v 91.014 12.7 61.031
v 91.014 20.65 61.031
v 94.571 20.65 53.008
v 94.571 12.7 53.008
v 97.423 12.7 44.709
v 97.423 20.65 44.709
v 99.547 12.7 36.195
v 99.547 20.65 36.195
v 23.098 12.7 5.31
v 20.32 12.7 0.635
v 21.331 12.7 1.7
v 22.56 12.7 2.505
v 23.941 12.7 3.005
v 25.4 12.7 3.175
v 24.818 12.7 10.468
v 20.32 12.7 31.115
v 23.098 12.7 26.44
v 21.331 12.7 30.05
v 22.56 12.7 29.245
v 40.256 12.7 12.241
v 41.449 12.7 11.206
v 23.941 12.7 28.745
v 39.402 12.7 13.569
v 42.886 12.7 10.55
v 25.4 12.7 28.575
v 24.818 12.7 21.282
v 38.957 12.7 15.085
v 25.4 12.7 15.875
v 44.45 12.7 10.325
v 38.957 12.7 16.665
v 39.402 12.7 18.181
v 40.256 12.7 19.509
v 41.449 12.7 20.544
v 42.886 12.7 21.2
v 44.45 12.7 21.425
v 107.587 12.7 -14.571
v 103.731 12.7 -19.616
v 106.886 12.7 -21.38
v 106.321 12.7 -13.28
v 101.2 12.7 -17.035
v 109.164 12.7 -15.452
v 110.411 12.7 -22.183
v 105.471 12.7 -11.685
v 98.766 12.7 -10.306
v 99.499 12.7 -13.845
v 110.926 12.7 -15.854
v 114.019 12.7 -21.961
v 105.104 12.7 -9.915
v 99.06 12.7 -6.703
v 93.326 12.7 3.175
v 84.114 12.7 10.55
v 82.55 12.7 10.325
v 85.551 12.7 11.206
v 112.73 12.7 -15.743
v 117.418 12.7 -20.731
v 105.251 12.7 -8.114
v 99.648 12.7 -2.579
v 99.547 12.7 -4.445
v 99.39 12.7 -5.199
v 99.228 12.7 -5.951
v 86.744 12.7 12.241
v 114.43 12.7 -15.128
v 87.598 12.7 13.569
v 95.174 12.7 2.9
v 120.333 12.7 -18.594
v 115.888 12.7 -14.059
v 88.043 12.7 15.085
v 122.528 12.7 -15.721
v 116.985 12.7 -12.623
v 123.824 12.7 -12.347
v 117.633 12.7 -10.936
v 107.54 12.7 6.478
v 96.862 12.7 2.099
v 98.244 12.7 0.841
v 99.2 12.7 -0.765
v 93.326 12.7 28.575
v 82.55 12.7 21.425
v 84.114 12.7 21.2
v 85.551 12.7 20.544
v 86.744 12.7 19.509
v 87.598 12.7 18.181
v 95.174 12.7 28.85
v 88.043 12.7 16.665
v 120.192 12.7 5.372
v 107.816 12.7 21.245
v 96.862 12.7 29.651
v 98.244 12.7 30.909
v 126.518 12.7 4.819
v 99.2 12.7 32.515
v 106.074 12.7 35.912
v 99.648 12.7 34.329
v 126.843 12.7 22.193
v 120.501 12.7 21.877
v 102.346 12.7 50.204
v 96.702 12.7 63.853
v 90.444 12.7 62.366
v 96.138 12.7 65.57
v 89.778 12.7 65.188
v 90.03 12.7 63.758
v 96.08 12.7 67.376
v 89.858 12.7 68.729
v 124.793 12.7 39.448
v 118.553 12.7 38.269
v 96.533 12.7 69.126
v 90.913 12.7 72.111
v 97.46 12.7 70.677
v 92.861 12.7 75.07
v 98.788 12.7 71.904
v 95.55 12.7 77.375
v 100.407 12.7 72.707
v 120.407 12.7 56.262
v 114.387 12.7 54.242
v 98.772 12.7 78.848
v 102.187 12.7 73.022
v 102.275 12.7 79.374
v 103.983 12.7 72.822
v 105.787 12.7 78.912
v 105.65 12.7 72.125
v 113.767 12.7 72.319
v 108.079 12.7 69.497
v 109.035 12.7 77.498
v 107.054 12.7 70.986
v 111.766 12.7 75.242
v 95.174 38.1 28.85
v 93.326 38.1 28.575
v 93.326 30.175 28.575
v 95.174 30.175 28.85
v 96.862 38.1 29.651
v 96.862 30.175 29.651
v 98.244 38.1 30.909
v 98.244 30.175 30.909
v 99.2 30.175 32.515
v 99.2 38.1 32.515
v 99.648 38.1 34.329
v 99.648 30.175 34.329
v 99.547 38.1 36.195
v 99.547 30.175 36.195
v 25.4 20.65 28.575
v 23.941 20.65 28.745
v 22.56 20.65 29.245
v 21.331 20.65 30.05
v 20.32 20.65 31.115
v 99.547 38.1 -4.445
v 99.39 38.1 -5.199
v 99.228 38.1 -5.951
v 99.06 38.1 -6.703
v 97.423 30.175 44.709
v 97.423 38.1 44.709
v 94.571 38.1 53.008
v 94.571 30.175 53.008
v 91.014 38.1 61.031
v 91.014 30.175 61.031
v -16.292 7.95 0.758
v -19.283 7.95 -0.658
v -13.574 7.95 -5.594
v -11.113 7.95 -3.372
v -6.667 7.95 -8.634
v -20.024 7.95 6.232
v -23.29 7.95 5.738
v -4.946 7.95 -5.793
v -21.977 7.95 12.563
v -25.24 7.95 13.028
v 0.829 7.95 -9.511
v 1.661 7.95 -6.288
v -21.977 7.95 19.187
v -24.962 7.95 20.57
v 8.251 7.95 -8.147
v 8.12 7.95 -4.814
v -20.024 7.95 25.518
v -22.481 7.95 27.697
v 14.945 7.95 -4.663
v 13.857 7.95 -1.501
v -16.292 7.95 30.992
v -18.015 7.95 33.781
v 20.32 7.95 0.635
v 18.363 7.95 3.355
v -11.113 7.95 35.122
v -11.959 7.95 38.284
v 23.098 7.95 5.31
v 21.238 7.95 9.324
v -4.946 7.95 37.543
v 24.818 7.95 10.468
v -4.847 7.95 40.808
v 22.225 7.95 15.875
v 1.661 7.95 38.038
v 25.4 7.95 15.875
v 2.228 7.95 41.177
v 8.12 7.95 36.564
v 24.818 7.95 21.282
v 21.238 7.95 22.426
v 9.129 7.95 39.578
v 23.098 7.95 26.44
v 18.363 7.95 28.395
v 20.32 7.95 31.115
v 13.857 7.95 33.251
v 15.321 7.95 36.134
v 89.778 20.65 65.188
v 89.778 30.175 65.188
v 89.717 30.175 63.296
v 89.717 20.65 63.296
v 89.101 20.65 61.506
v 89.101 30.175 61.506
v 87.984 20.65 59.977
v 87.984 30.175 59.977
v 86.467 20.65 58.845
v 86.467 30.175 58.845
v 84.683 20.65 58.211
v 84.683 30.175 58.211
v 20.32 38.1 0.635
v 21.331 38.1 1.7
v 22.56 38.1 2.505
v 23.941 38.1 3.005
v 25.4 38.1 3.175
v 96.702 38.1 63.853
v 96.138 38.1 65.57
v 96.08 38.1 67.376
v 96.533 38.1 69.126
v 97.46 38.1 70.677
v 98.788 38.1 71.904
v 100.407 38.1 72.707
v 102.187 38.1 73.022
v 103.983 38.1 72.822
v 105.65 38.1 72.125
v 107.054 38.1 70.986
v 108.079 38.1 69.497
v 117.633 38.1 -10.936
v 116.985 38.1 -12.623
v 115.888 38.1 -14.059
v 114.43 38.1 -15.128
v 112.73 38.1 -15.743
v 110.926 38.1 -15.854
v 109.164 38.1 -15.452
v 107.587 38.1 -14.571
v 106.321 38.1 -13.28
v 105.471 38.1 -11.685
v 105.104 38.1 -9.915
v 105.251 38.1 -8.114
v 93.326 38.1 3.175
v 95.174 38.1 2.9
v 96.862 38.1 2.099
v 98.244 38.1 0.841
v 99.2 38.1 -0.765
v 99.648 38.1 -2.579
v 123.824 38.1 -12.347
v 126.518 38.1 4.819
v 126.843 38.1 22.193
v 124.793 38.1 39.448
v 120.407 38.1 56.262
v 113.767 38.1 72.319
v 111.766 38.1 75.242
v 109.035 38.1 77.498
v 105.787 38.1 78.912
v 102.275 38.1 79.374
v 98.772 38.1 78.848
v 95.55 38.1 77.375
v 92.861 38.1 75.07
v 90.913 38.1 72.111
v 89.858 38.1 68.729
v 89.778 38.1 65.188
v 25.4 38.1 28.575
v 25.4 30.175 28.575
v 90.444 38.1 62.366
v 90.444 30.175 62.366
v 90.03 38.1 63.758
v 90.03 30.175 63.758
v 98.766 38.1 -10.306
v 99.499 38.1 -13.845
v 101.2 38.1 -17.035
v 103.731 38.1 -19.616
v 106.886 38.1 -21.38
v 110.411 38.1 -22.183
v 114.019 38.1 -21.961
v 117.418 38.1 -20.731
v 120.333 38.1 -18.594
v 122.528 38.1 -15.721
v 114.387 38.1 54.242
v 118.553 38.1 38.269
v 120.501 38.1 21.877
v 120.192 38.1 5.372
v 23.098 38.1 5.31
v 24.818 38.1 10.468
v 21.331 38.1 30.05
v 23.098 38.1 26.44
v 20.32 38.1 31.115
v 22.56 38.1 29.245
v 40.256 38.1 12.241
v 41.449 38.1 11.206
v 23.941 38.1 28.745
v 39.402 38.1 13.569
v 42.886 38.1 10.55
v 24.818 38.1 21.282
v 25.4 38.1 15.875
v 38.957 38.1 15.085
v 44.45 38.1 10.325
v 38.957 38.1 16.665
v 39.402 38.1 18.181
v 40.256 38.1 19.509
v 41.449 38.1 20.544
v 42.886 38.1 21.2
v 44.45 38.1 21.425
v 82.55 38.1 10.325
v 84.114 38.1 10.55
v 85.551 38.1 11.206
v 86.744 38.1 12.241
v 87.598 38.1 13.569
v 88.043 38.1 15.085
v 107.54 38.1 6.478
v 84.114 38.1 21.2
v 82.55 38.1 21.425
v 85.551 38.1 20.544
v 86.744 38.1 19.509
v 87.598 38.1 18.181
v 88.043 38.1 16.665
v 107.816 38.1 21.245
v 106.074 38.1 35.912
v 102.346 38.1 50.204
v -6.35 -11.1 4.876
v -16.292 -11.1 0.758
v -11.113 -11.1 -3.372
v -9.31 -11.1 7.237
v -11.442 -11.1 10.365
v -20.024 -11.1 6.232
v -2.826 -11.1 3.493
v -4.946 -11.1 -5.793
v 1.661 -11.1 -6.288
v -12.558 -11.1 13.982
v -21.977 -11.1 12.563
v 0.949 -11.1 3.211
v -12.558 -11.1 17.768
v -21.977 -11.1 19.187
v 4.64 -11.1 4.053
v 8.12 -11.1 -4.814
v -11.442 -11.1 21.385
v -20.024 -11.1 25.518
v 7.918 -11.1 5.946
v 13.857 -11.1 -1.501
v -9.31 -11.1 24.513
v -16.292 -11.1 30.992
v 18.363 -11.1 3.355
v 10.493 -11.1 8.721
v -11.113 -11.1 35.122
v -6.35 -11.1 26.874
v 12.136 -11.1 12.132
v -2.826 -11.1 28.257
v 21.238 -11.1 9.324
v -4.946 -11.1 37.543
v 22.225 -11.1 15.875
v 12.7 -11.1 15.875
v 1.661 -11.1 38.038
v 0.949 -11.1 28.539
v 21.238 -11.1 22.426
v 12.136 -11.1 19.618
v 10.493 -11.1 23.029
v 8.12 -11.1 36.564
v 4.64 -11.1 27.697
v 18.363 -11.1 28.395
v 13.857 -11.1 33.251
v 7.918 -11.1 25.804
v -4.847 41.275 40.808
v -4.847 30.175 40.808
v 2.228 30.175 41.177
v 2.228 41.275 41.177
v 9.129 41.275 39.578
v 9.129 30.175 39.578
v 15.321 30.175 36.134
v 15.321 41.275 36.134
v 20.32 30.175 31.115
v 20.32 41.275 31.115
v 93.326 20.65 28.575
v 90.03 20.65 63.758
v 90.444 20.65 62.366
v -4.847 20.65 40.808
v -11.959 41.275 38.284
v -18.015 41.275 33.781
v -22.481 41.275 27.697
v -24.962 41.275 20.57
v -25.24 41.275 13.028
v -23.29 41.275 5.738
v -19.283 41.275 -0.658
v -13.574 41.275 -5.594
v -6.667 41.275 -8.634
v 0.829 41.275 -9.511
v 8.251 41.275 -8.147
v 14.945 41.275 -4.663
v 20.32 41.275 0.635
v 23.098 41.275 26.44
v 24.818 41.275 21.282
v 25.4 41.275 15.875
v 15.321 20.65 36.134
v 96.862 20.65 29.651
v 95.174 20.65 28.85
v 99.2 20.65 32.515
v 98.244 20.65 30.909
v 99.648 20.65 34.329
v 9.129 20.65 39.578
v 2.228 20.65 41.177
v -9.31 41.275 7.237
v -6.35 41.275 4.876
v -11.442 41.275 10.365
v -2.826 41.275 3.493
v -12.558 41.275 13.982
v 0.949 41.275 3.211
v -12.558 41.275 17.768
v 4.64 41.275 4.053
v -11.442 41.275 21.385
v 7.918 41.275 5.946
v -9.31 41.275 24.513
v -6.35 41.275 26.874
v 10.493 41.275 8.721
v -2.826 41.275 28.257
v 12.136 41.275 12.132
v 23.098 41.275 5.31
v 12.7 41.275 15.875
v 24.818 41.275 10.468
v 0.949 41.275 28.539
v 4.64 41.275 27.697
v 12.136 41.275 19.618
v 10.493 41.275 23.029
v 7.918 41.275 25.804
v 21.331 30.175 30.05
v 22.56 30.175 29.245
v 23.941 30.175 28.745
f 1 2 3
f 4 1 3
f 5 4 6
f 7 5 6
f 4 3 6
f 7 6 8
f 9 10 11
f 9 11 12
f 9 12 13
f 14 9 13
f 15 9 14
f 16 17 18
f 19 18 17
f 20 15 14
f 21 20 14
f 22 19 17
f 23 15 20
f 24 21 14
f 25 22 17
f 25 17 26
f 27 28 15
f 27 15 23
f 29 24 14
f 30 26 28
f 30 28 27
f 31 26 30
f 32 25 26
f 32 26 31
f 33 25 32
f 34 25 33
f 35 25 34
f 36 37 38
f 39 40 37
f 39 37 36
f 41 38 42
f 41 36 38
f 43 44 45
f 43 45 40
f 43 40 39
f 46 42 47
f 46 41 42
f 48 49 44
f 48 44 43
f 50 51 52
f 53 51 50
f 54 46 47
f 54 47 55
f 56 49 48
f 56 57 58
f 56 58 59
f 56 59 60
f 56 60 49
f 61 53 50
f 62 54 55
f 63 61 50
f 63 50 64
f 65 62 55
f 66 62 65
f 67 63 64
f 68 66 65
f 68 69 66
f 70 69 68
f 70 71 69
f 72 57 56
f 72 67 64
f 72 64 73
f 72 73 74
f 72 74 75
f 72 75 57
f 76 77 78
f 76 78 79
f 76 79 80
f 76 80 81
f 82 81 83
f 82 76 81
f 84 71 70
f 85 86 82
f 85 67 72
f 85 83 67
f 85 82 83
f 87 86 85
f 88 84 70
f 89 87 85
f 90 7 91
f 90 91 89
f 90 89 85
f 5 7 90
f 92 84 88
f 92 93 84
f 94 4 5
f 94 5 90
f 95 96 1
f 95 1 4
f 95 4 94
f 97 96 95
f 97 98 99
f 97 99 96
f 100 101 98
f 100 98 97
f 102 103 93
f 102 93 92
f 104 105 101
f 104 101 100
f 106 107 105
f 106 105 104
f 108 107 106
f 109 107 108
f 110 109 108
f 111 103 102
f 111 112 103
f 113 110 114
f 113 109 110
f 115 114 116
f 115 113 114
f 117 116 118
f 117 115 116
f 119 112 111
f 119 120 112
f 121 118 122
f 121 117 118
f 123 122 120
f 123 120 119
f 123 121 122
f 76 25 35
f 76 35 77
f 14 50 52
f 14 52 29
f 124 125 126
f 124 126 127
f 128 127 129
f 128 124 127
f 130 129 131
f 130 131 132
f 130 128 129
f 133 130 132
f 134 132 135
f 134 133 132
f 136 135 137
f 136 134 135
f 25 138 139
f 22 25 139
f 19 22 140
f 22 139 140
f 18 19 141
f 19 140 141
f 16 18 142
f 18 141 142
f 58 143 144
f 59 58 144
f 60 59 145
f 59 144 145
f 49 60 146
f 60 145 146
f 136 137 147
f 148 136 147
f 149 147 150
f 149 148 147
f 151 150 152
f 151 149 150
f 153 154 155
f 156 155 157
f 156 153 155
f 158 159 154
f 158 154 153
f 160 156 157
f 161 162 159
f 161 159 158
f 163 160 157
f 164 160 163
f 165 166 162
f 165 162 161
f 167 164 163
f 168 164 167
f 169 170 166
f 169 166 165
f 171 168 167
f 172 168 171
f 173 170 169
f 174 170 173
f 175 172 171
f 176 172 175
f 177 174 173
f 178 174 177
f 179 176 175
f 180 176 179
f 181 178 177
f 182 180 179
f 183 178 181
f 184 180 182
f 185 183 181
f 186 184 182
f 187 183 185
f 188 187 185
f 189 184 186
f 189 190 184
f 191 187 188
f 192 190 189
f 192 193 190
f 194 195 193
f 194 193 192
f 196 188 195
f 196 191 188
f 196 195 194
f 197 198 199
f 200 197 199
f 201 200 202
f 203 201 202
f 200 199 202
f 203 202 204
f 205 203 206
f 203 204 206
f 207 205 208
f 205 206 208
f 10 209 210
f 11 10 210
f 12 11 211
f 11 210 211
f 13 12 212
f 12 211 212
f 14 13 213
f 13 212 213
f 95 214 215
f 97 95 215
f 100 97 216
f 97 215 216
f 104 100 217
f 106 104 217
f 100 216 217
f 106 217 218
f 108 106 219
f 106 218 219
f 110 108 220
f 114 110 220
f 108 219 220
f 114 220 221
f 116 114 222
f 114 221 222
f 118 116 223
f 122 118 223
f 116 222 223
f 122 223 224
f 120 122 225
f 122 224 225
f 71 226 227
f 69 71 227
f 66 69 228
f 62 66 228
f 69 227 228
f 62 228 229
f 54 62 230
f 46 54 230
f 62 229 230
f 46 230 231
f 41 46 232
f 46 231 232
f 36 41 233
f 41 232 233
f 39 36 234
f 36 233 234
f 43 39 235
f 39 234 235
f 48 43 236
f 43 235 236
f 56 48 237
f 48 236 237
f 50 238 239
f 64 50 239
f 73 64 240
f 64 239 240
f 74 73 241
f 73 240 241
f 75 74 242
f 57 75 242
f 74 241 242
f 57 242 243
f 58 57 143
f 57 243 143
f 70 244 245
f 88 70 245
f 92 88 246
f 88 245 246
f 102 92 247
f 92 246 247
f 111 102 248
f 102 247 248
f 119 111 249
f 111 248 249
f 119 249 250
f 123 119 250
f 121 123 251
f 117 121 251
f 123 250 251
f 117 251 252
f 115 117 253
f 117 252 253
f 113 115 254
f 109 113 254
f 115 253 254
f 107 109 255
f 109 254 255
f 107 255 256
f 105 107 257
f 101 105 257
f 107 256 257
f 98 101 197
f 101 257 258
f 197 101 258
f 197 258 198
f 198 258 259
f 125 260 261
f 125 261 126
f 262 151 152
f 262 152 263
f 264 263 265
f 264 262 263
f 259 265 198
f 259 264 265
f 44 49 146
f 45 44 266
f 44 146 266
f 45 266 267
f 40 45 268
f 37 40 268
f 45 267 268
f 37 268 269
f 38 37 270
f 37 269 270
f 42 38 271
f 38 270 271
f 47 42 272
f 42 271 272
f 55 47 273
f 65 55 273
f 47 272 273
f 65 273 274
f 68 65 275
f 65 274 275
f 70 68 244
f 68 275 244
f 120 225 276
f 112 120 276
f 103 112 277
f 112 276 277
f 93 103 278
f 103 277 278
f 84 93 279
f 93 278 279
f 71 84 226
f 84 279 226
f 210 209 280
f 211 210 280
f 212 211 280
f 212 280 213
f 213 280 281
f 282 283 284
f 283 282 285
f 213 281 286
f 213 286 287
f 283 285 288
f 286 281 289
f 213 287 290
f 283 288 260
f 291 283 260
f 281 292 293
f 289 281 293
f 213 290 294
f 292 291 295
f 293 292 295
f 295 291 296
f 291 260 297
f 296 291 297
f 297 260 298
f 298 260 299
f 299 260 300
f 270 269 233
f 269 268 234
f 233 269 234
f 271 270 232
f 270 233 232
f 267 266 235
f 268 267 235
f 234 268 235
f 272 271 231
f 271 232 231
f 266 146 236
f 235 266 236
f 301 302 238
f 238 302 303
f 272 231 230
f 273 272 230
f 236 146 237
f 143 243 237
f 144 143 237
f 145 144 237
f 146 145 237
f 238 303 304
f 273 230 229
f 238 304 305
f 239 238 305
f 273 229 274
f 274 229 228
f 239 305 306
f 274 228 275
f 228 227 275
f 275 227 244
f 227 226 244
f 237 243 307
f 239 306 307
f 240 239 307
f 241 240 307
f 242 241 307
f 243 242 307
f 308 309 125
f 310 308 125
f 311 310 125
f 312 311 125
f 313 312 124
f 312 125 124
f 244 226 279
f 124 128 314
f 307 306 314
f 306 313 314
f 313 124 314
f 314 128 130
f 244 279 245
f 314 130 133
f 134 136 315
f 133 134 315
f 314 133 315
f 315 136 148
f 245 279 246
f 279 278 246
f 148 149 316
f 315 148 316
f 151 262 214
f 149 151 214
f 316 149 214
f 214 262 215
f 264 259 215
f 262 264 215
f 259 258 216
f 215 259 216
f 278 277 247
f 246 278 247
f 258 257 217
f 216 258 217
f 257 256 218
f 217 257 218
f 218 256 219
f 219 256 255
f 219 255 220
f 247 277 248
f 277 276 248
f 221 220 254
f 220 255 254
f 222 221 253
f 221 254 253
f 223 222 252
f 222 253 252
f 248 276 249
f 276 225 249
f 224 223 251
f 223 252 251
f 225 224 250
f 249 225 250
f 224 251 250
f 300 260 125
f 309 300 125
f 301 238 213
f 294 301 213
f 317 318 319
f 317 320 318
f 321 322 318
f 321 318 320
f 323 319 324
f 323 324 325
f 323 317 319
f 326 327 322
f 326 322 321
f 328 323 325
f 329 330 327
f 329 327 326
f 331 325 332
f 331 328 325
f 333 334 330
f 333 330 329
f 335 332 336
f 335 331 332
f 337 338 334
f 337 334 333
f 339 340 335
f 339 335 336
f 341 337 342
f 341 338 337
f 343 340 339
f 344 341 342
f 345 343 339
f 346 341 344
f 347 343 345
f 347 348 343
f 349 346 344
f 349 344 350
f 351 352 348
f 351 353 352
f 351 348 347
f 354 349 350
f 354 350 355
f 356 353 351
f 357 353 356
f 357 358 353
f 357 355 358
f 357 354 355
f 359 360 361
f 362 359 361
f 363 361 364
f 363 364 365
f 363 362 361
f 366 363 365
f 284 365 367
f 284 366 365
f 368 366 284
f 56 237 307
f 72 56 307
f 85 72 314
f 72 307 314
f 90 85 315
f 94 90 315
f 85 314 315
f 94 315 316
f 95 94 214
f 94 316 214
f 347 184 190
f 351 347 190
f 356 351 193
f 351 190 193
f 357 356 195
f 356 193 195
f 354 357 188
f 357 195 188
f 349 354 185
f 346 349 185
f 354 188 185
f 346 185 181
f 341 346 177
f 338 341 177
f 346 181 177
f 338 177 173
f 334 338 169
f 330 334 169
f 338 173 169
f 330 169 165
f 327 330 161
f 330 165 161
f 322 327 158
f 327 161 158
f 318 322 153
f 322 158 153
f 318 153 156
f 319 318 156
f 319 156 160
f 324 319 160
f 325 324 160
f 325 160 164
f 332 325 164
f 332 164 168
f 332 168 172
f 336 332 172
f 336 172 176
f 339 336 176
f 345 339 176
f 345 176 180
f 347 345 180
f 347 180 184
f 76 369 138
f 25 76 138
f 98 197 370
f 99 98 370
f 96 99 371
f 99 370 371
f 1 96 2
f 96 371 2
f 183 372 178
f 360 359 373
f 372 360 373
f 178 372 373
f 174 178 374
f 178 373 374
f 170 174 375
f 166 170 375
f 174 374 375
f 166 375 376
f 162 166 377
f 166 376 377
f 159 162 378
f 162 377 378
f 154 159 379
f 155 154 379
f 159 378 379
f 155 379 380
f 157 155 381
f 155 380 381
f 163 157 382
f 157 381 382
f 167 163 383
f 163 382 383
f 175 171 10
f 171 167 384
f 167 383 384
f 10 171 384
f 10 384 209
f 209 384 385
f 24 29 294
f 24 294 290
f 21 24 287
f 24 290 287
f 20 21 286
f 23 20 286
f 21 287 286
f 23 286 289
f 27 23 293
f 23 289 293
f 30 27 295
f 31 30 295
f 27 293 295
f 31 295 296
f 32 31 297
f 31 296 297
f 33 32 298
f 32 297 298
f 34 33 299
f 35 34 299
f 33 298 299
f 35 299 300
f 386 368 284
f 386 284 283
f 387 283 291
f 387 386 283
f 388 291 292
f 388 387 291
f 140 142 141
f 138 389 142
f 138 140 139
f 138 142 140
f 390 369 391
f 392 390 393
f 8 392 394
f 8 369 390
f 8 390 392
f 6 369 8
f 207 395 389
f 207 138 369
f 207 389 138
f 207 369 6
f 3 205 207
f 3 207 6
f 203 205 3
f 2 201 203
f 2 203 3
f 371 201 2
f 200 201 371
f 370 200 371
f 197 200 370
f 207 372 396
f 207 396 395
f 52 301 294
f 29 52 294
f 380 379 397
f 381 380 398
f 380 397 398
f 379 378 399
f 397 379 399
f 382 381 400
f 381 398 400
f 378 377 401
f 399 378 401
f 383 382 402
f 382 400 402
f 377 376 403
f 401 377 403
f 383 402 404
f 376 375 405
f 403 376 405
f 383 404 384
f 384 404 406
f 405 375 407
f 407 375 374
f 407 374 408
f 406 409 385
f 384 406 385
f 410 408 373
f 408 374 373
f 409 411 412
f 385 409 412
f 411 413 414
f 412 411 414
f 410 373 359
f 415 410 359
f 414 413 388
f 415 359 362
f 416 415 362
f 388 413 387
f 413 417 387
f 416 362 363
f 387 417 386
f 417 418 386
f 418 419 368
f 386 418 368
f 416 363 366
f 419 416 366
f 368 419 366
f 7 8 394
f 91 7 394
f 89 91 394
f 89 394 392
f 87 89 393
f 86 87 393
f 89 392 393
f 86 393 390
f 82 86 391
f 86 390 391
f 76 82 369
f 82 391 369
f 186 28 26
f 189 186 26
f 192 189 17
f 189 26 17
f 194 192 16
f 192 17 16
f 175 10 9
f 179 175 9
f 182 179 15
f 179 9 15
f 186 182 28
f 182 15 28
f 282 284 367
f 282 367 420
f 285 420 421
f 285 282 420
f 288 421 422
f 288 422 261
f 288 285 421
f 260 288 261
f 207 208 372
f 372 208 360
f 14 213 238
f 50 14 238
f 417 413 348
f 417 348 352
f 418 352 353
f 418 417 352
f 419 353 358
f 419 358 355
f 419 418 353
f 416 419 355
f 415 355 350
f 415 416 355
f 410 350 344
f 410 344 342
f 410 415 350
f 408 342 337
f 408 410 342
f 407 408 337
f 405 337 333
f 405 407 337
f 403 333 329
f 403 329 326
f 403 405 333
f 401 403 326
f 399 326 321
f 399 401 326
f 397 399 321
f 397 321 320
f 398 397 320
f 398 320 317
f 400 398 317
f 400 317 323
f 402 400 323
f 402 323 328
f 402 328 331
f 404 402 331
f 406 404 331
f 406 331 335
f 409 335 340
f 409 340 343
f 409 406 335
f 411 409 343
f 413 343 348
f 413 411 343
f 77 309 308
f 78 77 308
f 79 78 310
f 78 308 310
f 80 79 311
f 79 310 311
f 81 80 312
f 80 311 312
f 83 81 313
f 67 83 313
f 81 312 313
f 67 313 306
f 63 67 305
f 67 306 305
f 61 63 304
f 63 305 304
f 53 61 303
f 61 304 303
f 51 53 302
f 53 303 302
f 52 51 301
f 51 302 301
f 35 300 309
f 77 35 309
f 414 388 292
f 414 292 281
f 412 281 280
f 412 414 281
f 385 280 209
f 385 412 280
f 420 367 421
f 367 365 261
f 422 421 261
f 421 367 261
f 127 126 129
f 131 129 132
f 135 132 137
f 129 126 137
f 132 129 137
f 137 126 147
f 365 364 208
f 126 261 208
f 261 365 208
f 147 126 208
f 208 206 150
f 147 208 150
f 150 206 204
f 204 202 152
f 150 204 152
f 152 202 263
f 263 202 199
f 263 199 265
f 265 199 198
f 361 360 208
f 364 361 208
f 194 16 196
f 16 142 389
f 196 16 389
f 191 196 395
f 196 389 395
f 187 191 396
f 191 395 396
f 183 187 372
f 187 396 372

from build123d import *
from build123d import SkipClean  # not in build123d's __all__

# Parameters (mm, degrees)
F0_R     = 22.225
F1_DEPTH = 33.3248
F0_R_2   = 12.7
F2_DEPTH = 52.3748
F3_DEPTH = 28.575
F4_DEPTH = 20.6248
F5_DEPTH = 3.175
F6_DEPTH = 11.0998
F7_ANGLE = 90


with BuildPart() as f1:
    # F0 (on Top) → F1 (new body)
    with BuildSketch(Plane.XY):
        with BuildLine():
            ThreePointArc((20.32, 15.24), (9.1294627068, 23.7025929106), (-4.8465484826, 24.9333304596))
            ThreePointArc((-4.8465484826, 24.9333304596), (-21.5251259118, -13.4843967044), (20.32, -15.24))
            ThreePointArc((20.32, -15.24), (24.0965557705, -8.0321852568), (25.4, 0))
            ThreePointArc((25.4, 0), (24.0965557705, 8.0321852568), (20.32, 15.24))
        make_face()
        Circle(F0_R, mode=Mode.SUBTRACT)
    extrude(amount=F1_DEPTH)

    # F0 (on Top) → F2 (join)
    with BuildSketch(Plane.XY):
        Circle(F0_R)
        Circle(F0_R_2, mode=Mode.SUBTRACT)
    extrude(amount=F2_DEPTH)

    # F0 (on Top) → F3 (join)
    with BuildSketch(Plane.XY):
        with BuildLine():
            ThreePointArc((123.8244974665, -28.2222222222), (126.1134026015, 14.9803098855), (113.7674148927, 56.4444444444))
            ThreePointArc((113.7674148927, 56.4444444444), (98.7718041015, 62.9734869687), (89.7780268905, 49.313007081))
            ThreePointArc((89.7780268905, 49.313007081), (90.2171864347, 47.1811306981), (91.0139319141, 45.1555555556))
            ThreePointArc((91.0139319141, 45.1555555556), (96.0863854596, 33.0146411355), (99.5472631467, 20.32))
            ThreePointArc((99.5472631467, 20.32), (98.2442480497, 15.0339073716), (93.3255592, 12.7))
            Line((93.3255592, 12.7), (57.15, 12.7))
            Line((57.15, 12.7), (25.4, 12.7))
            ThreePointArc((25.4, 12.7), (22.5601936686, 13.3703873372), (20.32, 15.24))
            ThreePointArc((20.32, 15.24), (24.0965557705, 8.0321852568), (25.4, 0))
            ThreePointArc((25.4, 0), (24.0965557705, -8.0321852568), (20.32, -15.24))
            ThreePointArc((20.32, -15.24), (22.5601936686, -13.3703873372), (25.4, -12.7))
            Line((25.4, -12.7), (54.6792037785, -12.7))
            Line((54.6792037785, -12.7), (93.3255592, -12.7))
            ThreePointArc((93.3255592, -12.7), (98.2442480497, -15.0339073716), (99.5472631467, -20.32))
            ThreePointArc((99.5472631467, -20.32), (99.3098469997, -21.4502747977), (99.0595979732, -22.5777777778))
            ThreePointArc((99.0595979732, -22.5777777778), (108.6198254977, -37.7824497467), (123.8244974665, -28.2222222222))
        make_face()
        with BuildLine():
            ThreePointArc((82.55, 5.5499), (88.0999, 0), (82.55, -5.5499))
            Line((82.55, -5.5499), (44.45, -5.5499))
            ThreePointArc((44.45, -5.5499), (38.9001, 0), (44.45, 5.5499))
            Line((44.45, 5.5499), (82.55, 5.5499))
        make_face(mode=Mode.SUBTRACT)
        with BuildLine():
            ThreePointArc((117.6332725932, -26.8111111111), (110.0309366088, -31.5912248733), (105.2508228466, -23.9888888889))
            ThreePointArc((105.2508228466, -23.9888888889), (107.1963922113, 12.7332634026), (96.7023026588, 47.9777777778))
            ThreePointArc((96.7023026588, 47.9777777778), (99.5684511812, 56.4883707446), (108.079044148, 53.6222222222))
            ThreePointArc((108.079044148, 53.6222222222), (119.8077324715, 14.2312943912), (117.6332725932, -26.8111111111))
        make_face(mode=Mode.SUBTRACT)
    extrude(amount=F3_DEPTH)

    # F0 (on Top) → F4 (join)
    with BuildSketch(Plane.XY):
        with BuildLine():
            ThreePointArc((91.0139319141, 45.1555555556), (90.2171864347, 47.1811306981), (89.7780268905, 49.313007081))
            ThreePointArc((89.7780268905, 49.313007081), (88.599955582, 44.8247099647), (84.6833407547, 42.3361780066))
            Line((84.6833407547, 42.3361780066), (-4.8465484826, 24.9333304596))
            ThreePointArc((-4.8465484826, 24.9333304596), (9.1294627068, 23.7025929106), (20.32, 15.24))
            ThreePointArc((20.32, 15.24), (22.5601936686, 13.3703873372), (25.4, 12.7))
            Line((25.4, 12.7), (57.15, 12.7))
            Line((57.15, 12.7), (93.3255592, 12.7))
            ThreePointArc((93.3255592, 12.7), (98.2442480497, 15.0339073716), (99.5472631467, 20.32))
            ThreePointArc((99.5472631467, 20.32), (96.0863854596, 33.0146411355), (91.0139319141, 45.1555555556))
        make_face()
    extrude(amount=F4_DEPTH)

    # F0 (on Top) → F5 (cut)
    with BuildSketch(Plane.XY):
        with BuildLine():
            ThreePointArc((123.8244974665, -28.2222222222), (126.1134026015, 14.9803098855), (113.7674148927, 56.4444444444))
            ThreePointArc((113.7674148927, 56.4444444444), (98.7718041015, 62.9734869687), (89.7780268905, 49.313007081))
            ThreePointArc((89.7780268905, 49.313007081), (90.2171864347, 47.1811306981), (91.0139319141, 45.1555555556))
            ThreePointArc((91.0139319141, 45.1555555556), (96.0863854596, 33.0146411355), (99.5472631467, 20.32))
            ThreePointArc((99.5472631467, 20.32), (98.2442480497, 15.0339073716), (93.3255592, 12.7))
            Line((93.3255592, 12.7), (57.15, 12.7))
            Line((57.15, 12.7), (25.4, 12.7))
            ThreePointArc((25.4, 12.7), (22.5601936686, 13.3703873372), (20.32, 15.24))
            ThreePointArc((20.32, 15.24), (24.0965557705, 8.0321852568), (25.4, 0))
            ThreePointArc((25.4, 0), (24.0965557705, -8.0321852568), (20.32, -15.24))
            ThreePointArc((20.32, -15.24), (22.5601936686, -13.3703873372), (25.4, -12.7))
            Line((25.4, -12.7), (54.6792037785, -12.7))
            Line((54.6792037785, -12.7), (93.3255592, -12.7))
            ThreePointArc((93.3255592, -12.7), (98.2442480497, -15.0339073716), (99.5472631467, -20.32))
            ThreePointArc((99.5472631467, -20.32), (99.3098469997, -21.4502747977), (99.0595979732, -22.5777777778))
            ThreePointArc((99.0595979732, -22.5777777778), (108.6198254977, -37.7824497467), (123.8244974665, -28.2222222222))
        make_face()
        with BuildLine():
            ThreePointArc((82.55, 5.5499), (88.0999, 0), (82.55, -5.5499))
            Line((82.55, -5.5499), (44.45, -5.5499))
            ThreePointArc((44.45, -5.5499), (38.9001, 0), (44.45, 5.5499))
            Line((44.45, 5.5499), (82.55, 5.5499))
        make_face(mode=Mode.SUBTRACT)
        with BuildLine():
            ThreePointArc((117.6332725932, -26.8111111111), (110.0309366088, -31.5912248733), (105.2508228466, -23.9888888889))
            ThreePointArc((105.2508228466, -23.9888888889), (107.1963922113, 12.7332634026), (96.7023026588, 47.9777777778))
            ThreePointArc((96.7023026588, 47.9777777778), (99.5684511812, 56.4883707446), (108.079044148, 53.6222222222))
            ThreePointArc((108.079044148, 53.6222222222), (119.8077324715, 14.2312943912), (117.6332725932, -26.8111111111))
        make_face(mode=Mode.SUBTRACT)
    with SkipClean():  # cleaning this boolean's faces spoils the solid; the shape is the same uncleaned
        extrude(amount=F5_DEPTH, mode=Mode.SUBTRACT)

    # F0 (on Top) → F6 (cut)
    with BuildSketch(Plane.XY):
        with BuildLine():
            ThreePointArc((91.0139319141, 45.1555555556), (90.2171864347, 47.1811306981), (89.7780268905, 49.313007081))
            ThreePointArc((89.7780268905, 49.313007081), (88.599955582, 44.8247099647), (84.6833407547, 42.3361780066))
            Line((84.6833407547, 42.3361780066), (-4.8465484826, 24.9333304596))
            ThreePointArc((-4.8465484826, 24.9333304596), (9.1294627068, 23.7025929106), (20.32, 15.24))
            ThreePointArc((20.32, 15.24), (22.5601936686, 13.3703873372), (25.4, 12.7))
            Line((25.4, 12.7), (57.15, 12.7))
            Line((57.15, 12.7), (93.3255592, 12.7))
            ThreePointArc((93.3255592, 12.7), (98.2442480497, 15.0339073716), (99.5472631467, 20.32))
            ThreePointArc((99.5472631467, 20.32), (96.0863854596, 33.0146411355), (91.0139319141, 45.1555555556))
        make_face()
    with SkipClean():  # cleaning this boolean's faces spoils the solid; the shape is the same uncleaned
        extrude(amount=F6_DEPTH, mode=Mode.SUBTRACT)


with BuildPart() as f1_1:
    # F7: moved
    add(f1.part.rotate(Axis((59.3627796, 12.7, 28.575), (1, 0, 0)), F7_ANGLE), clean=False)


solid = f1_1.part
